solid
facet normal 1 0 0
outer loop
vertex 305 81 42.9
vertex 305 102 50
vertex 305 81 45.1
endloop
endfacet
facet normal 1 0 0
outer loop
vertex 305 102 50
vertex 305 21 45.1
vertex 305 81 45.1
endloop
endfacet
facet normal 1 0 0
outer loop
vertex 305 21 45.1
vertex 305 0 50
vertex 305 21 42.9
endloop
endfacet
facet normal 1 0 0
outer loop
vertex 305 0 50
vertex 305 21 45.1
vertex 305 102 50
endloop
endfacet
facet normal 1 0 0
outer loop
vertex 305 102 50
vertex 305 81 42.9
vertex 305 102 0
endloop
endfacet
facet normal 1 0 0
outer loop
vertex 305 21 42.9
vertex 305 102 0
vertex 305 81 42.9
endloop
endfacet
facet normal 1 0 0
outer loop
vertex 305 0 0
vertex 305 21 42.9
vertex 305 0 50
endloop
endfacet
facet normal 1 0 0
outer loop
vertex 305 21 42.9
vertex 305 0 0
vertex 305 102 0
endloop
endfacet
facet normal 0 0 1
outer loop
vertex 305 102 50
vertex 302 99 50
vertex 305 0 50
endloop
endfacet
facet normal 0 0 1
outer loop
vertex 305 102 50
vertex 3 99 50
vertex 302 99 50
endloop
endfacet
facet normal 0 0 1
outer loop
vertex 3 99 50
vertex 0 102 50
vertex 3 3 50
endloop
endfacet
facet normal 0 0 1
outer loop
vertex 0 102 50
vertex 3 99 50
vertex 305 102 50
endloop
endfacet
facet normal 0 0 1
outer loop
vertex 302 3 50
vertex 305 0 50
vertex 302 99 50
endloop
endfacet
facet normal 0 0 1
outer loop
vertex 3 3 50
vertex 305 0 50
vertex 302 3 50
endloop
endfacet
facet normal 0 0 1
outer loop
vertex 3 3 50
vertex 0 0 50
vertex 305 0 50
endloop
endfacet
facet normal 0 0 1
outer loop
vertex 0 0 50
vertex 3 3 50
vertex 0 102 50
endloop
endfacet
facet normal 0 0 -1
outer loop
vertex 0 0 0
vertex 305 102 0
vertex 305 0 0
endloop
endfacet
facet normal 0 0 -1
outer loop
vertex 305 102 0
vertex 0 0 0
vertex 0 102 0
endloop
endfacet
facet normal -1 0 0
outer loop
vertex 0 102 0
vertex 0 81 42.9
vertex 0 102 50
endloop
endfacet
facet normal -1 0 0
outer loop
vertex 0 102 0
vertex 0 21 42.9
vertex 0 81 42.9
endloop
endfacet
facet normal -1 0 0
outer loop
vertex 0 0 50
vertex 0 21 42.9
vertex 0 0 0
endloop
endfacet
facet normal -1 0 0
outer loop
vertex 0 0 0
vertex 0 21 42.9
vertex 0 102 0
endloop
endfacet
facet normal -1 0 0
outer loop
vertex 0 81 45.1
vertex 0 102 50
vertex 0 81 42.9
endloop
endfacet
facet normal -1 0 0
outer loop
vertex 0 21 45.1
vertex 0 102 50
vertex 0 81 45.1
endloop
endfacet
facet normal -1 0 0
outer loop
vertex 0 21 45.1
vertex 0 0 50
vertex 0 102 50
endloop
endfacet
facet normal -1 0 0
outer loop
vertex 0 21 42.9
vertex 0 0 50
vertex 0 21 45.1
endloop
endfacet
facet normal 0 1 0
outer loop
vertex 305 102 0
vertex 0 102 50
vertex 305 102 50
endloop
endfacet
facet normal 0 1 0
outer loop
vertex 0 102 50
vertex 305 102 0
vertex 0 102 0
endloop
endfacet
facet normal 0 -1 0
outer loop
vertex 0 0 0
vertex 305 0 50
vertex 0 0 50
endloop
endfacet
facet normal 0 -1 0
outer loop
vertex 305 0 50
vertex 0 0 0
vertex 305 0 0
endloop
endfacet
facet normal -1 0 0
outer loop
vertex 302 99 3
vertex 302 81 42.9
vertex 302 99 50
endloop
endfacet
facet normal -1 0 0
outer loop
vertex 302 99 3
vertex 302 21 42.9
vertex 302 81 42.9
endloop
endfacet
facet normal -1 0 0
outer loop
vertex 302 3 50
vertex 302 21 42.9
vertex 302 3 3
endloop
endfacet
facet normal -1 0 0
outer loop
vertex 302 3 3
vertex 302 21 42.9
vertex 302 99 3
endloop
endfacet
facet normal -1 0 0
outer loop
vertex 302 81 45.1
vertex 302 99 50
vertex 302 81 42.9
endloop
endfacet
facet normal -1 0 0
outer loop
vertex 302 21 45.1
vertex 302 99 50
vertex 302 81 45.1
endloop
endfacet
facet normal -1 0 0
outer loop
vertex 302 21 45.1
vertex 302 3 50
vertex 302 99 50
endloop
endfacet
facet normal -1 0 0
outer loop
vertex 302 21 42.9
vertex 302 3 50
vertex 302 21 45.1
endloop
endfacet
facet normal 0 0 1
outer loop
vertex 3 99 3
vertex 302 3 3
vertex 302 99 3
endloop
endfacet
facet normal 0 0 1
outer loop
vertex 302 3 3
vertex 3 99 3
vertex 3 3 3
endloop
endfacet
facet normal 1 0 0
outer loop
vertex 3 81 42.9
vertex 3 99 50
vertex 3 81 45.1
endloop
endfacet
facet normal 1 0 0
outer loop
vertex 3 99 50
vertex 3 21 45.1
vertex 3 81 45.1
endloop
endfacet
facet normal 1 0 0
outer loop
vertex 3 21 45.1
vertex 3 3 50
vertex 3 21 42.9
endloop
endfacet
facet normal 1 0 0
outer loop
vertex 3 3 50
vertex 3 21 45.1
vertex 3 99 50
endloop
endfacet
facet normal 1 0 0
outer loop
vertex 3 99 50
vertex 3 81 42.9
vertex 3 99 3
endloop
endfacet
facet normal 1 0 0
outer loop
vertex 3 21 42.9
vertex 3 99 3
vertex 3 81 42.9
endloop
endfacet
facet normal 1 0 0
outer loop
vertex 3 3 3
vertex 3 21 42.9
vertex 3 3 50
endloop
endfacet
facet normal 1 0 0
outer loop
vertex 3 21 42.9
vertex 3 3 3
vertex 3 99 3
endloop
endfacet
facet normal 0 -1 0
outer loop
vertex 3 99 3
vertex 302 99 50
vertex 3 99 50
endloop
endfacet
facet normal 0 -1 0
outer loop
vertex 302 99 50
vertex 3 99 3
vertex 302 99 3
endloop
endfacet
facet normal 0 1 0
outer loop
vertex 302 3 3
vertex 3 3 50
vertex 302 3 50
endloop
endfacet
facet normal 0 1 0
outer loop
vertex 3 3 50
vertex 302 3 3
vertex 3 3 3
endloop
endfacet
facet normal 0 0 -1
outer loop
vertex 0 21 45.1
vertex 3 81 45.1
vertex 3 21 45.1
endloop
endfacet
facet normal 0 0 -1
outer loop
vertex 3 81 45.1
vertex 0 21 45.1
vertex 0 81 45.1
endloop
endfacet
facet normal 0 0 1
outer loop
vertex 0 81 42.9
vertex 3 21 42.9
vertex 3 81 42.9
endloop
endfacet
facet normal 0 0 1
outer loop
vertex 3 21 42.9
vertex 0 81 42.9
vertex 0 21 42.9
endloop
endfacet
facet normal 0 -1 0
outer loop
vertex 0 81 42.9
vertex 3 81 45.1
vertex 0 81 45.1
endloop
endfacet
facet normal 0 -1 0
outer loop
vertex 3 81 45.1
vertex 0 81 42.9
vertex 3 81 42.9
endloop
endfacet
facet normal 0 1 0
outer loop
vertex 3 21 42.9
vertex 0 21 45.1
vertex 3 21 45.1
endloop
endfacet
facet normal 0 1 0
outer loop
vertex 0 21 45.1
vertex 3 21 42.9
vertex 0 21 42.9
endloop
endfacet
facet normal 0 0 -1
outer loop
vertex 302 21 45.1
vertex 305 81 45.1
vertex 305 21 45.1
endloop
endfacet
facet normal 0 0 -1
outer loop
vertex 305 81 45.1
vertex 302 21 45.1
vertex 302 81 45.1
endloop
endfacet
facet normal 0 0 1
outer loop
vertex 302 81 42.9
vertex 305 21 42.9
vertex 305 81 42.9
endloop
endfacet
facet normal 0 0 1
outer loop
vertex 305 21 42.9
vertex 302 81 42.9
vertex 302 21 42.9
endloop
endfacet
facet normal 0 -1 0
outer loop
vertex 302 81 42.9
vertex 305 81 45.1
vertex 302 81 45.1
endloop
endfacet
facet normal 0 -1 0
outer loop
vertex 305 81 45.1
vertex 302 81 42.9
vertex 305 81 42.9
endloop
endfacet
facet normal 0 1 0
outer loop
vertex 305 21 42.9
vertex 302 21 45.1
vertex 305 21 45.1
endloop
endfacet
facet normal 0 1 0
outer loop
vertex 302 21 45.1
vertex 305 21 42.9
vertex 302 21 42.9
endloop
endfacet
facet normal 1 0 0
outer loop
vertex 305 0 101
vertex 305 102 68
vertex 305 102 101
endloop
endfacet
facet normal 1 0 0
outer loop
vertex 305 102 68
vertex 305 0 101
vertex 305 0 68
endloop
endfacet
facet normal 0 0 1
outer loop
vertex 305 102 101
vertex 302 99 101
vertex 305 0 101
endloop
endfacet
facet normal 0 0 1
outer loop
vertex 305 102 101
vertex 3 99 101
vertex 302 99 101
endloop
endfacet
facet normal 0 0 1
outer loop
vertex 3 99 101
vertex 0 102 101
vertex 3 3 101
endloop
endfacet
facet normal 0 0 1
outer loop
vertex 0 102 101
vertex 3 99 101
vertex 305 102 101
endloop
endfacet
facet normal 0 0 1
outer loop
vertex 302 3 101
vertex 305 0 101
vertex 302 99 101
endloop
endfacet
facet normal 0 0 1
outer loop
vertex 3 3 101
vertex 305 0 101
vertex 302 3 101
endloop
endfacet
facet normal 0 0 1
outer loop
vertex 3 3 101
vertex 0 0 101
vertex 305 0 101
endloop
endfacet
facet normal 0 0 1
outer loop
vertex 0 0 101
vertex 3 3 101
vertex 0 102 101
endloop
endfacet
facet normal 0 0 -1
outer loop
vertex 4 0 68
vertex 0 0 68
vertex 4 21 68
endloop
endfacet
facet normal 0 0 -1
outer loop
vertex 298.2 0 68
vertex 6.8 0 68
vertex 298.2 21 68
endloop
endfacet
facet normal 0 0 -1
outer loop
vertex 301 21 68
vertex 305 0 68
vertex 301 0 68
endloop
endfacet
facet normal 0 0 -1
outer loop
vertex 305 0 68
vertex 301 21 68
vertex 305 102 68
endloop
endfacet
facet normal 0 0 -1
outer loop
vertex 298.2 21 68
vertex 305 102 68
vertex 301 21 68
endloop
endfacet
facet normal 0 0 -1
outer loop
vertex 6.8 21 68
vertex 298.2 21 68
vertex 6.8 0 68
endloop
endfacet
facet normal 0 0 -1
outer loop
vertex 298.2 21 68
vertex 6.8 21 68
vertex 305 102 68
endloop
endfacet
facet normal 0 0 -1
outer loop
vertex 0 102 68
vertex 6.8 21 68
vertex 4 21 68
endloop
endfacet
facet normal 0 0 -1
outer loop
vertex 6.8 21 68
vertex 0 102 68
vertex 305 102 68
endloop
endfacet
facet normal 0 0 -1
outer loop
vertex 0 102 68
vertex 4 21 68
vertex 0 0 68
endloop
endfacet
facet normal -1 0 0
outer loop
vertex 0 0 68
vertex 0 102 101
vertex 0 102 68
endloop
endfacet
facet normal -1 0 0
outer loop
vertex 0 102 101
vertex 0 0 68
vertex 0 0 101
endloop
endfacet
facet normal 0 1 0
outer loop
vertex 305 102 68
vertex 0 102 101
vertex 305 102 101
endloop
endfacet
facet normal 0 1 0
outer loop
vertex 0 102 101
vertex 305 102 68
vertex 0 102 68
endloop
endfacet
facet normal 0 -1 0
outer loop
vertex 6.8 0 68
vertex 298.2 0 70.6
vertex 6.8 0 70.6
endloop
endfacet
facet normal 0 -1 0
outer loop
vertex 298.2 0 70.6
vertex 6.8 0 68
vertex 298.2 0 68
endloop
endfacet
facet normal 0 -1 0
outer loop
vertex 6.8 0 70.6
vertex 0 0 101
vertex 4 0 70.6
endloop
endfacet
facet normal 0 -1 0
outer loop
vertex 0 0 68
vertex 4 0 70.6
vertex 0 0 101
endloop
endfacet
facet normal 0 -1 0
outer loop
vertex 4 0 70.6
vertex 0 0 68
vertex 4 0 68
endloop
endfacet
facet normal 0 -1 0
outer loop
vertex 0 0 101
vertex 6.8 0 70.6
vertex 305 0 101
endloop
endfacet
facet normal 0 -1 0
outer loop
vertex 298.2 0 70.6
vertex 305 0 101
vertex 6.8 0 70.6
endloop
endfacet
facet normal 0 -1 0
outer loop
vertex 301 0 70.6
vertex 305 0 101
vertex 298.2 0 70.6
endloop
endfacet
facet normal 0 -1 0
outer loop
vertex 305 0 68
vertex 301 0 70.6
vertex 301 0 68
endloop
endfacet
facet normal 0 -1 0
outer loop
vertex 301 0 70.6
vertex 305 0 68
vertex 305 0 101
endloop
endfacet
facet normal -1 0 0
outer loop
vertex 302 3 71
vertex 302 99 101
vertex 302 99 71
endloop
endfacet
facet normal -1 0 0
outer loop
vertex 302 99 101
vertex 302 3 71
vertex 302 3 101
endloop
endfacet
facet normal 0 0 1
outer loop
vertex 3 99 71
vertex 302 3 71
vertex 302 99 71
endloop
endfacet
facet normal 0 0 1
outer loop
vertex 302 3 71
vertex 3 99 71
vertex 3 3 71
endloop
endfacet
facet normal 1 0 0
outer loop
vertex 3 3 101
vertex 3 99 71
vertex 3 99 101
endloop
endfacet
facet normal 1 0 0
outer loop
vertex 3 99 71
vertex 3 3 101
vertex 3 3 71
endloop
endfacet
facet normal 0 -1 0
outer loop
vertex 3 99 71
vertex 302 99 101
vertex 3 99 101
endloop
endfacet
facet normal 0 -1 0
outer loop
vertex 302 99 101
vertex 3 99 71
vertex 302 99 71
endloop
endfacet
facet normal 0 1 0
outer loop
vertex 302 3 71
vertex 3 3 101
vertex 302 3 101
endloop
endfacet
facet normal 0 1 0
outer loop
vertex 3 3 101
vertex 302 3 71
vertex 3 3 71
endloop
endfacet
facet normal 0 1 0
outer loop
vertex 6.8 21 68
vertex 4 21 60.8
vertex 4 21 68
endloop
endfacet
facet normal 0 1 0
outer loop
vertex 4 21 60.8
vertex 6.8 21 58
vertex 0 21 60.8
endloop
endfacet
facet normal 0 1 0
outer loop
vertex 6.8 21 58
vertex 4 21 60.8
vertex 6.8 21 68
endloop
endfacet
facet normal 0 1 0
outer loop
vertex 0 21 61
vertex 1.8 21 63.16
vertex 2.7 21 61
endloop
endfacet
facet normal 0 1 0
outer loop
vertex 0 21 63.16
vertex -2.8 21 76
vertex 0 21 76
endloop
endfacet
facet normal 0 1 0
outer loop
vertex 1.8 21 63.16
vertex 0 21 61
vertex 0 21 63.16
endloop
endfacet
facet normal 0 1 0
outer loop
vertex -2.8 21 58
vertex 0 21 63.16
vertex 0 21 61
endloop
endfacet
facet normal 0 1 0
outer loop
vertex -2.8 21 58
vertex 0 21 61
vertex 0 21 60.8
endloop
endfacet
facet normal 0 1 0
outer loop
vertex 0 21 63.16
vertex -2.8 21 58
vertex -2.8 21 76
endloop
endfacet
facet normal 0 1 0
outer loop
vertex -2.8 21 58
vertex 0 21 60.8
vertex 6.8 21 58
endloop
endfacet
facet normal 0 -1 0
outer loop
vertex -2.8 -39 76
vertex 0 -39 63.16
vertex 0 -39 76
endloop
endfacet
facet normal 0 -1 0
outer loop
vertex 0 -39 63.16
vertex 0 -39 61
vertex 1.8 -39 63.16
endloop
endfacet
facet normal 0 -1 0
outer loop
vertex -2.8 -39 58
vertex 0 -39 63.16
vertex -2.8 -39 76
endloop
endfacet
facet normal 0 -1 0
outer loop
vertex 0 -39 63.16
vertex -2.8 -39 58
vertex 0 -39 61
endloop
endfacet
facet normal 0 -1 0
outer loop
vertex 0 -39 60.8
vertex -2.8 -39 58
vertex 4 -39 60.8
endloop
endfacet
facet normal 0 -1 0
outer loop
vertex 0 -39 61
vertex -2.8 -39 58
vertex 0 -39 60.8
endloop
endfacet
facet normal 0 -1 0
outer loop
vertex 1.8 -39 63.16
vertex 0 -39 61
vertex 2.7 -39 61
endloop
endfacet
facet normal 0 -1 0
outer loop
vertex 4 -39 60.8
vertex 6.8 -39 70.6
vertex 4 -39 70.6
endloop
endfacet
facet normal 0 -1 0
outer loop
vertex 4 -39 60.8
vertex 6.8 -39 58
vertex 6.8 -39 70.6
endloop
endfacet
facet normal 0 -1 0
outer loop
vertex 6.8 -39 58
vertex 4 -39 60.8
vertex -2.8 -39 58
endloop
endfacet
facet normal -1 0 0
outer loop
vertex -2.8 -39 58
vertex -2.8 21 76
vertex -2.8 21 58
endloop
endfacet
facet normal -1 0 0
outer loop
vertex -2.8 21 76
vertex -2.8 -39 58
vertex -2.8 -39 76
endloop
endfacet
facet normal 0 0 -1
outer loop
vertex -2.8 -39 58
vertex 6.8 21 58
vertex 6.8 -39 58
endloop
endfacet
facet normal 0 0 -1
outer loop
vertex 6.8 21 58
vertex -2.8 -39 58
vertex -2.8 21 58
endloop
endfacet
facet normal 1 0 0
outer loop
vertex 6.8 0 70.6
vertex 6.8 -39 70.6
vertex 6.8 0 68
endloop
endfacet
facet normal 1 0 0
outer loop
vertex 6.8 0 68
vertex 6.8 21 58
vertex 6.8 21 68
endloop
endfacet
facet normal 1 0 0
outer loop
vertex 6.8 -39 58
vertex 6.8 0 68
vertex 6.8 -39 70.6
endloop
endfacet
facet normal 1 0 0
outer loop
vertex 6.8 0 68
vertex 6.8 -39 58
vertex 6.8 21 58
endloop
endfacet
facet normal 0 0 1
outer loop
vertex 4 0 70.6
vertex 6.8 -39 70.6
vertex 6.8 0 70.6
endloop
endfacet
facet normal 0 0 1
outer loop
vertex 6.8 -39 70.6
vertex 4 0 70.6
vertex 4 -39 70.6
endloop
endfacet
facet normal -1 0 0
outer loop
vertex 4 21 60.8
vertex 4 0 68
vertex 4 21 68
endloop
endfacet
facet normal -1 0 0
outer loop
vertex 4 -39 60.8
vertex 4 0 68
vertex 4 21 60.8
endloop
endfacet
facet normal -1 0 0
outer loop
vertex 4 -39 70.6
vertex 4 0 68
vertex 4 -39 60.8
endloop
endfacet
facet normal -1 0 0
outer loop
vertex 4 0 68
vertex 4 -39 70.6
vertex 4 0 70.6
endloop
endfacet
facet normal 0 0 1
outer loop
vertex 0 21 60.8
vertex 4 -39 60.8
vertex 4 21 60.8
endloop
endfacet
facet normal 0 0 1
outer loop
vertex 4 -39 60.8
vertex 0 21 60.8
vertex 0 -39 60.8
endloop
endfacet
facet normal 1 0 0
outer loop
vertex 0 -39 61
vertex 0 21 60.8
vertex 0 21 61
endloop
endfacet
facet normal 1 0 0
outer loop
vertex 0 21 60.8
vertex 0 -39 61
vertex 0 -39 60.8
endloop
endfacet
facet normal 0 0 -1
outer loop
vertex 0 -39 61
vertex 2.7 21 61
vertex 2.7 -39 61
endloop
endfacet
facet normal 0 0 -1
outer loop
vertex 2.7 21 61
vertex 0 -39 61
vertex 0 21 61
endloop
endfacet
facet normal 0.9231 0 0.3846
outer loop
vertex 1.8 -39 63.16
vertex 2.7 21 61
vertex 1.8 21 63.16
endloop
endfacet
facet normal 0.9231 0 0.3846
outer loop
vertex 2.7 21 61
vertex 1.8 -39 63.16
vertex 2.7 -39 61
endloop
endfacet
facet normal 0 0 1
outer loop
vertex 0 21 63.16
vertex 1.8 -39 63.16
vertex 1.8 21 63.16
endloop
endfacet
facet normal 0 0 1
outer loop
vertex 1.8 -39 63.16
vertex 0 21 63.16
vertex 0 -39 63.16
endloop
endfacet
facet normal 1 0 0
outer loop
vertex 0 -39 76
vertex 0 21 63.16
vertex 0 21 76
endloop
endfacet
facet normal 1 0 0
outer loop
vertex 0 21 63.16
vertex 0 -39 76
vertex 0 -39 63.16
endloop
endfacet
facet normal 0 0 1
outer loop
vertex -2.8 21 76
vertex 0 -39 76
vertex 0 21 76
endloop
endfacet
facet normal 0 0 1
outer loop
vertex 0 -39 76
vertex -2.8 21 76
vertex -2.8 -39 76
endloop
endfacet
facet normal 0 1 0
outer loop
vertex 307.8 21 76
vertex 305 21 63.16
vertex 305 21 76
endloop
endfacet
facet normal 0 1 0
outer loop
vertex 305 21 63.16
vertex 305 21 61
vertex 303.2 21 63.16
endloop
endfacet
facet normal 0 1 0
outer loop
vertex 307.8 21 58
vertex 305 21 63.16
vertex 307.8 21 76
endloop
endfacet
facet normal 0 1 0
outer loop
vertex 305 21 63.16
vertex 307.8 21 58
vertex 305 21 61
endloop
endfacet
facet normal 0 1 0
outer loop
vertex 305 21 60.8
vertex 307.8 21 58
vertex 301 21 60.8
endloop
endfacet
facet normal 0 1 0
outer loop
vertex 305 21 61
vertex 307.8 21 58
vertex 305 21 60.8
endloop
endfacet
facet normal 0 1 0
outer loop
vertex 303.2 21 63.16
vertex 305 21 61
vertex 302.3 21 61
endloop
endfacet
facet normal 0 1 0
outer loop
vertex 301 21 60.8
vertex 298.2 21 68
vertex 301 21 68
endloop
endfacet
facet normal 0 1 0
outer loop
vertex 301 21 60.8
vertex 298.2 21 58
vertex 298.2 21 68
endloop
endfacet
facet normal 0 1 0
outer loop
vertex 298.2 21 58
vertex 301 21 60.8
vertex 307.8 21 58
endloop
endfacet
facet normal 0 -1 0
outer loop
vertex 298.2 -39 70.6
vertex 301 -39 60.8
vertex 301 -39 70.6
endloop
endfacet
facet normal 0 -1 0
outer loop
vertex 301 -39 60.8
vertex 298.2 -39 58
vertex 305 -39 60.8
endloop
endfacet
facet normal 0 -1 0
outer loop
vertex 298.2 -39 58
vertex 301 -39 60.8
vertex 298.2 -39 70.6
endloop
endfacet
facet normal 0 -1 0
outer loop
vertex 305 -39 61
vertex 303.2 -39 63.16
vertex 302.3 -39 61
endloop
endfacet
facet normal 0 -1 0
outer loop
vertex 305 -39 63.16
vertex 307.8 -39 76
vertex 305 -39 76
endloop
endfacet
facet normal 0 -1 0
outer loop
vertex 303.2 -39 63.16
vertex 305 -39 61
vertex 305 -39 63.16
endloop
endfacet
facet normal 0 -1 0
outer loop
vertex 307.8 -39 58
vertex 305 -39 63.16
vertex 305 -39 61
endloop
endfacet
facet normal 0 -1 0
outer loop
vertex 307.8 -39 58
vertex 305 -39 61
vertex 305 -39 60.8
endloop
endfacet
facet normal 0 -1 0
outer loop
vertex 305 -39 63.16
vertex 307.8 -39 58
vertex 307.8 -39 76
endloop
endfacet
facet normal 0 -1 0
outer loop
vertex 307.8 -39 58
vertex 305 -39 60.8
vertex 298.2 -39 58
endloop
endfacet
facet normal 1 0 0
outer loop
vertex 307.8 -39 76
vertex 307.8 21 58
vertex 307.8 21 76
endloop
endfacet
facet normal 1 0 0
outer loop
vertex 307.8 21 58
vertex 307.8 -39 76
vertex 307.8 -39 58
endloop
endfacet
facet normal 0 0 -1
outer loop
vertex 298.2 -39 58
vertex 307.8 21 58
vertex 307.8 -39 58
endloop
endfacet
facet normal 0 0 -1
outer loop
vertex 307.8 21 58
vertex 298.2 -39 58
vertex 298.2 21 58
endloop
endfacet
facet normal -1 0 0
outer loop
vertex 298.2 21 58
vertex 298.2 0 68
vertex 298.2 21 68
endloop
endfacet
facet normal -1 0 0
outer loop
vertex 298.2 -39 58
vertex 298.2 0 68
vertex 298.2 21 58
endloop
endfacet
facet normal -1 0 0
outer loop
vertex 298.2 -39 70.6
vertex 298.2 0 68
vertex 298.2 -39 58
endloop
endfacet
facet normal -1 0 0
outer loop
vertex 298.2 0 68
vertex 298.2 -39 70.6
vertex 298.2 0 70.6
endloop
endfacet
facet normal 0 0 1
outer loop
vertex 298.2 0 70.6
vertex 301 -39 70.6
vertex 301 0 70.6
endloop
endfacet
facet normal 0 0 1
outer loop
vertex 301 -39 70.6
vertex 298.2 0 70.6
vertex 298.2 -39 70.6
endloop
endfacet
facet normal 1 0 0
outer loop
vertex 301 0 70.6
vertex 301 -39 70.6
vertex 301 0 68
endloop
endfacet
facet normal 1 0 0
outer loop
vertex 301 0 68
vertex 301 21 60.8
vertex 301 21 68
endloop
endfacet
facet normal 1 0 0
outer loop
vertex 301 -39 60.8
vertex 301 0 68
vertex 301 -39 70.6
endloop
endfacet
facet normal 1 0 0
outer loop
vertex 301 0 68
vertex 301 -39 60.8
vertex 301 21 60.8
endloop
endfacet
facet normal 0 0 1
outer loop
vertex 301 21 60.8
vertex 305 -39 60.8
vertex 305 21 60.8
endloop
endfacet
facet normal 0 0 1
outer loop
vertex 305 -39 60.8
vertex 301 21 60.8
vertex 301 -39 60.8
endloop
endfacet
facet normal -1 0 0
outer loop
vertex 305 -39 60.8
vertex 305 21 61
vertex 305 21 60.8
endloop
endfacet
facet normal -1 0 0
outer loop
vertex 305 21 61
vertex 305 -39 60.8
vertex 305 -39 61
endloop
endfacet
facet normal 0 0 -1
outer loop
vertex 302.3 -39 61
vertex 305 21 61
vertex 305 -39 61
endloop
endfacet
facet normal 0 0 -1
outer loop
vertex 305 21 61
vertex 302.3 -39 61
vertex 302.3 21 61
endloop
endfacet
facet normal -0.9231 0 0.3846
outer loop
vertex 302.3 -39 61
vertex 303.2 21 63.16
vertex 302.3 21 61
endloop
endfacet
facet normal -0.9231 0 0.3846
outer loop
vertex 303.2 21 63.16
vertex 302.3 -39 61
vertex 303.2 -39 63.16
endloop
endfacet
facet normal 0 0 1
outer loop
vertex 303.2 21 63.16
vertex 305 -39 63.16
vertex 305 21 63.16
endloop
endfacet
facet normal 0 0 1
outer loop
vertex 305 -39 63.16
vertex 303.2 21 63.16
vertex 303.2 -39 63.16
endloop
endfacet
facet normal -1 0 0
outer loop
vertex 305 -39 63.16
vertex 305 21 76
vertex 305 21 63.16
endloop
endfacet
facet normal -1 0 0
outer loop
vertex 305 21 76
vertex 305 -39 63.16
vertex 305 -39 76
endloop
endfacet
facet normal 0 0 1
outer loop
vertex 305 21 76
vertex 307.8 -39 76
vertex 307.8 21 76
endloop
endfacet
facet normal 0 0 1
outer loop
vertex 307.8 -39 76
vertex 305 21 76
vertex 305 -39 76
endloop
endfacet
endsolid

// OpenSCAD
// 05_c_clip_ends.scad
// Push-down C-clips on short ends: two independent C-shaped clips (one per
// short end, Y=0 and Y=LY) that slide over BOTH mating walls simultaneously.
// Each clip wraps around the junction of upper+lower tray on the short face,
// with an inner ledge that hooks under the lower tray's top rim.
// Engage: push clip straight DOWN onto the stacked short-end walls.
// Release: pull clip straight UP (or lever with fingernail under the bottom lip).
// Also resists X-slide via friction fit of the C-channel width.

$fn = 36;
EXPLODE = 18;  // 0 = engaged, >0 = exploded view

/* ---- tray dimensions ---- */
LX = 305; LY = 102; LZ = 50;   // lower tray (short dim = Y = 102mm)
UX = 305; UY = 102; UZ = 33;   // upper tray
W  = 3;                          // wall thickness

/* ---- C-clip params ---- */
// The clip straddles the combined wall thickness on the short-end (X) face.
// Short end = X=0 and X=LX faces.  Combined stack thickness = W (lower) + W (upper)
// The C channel is slightly deeper to also grip the step.

CC_W    = 60;    // width of clip along Y (centered on the short end face)
CC_T    = 2.8;   // clip arm thickness
CC_H    = 18;    // total clip height (spans across tray junction + ledge zone)
// inner channel width = combined wall thickness of stacked trays + small gap
WALL_STACK = W;  // both trays have the same wall, they are flush on the outer face
// The lower tray wall outer face is the reference; upper sits on top, same X.
CHANNEL_W = W + 1.0;  // inner slot width: snug on the wall
CHANNEL_DEPTH = CC_H; // full depth, open bottom

// snap ledge on the INSIDE of the clip's inner (lower) arm
// hooks under a small notch printed on the lower tray end wall
LEDGE_H  = 1.8;  // ledge height on clip inner arm (protrudes inward in Z)
LEDGE_OFF = 3.0; // from bottom of clip
NOTCH_H  = 2.0;  // matching notch height in lower tray
NOTCH_D  = 1.6;  // notch depth (inward from outer face)

// Clip centered on short end face at X=0; the face runs in Y from 0..LY
// Clip spans Y from (LY/2 - CC_W/2) to (LY/2 + CC_W/2)
CC_Y0 = LY/2 - CC_W/2;

// vertical position: clip sits straddling the LZ (top of lower tray)
// bottom of clip at LZ - (CC_H - overlap), where overlap into lower tray region
OVERLAP = 10;   // how far clip descends below LZ
CC_Z0   = LZ - OVERLAP;

module lower_tray() {
    color("SteelBlue", 0.85)
    union() {
        difference() {
            cube([LX, LY, LZ]);
            translate([W, W, W]) cube([LX-2*W, LY-2*W, LZ]);
            // Notch on X=0 short end face for clip ledge
            translate([-0.1, CC_Y0, CC_Z0 + LEDGE_OFF - 0.1])
                cube([W + NOTCH_D + 0.1, CC_W, NOTCH_H + 0.2]);
            // Notch on X=LX short end face
            translate([LX - W - NOTCH_D, CC_Y0, CC_Z0 + LEDGE_OFF - 0.1])
                cube([W + NOTCH_D + 0.1, CC_W, NOTCH_H + 0.2]);
        }
    }
}

module upper_tray() {
    color("Tomato", 0.85)
    difference() {
        cube([UX, UY, UZ]);
        translate([W, W, W]) cube([UX-2*W, UY-2*W, UZ]);
    }
}

// C-clip cross section profile in the XZ plane (local coords)
// The C opens upward (so it can push down over the wall stack)
// x=0 is the outer face of the tray wall
// z=0 is bottom of clip
// Channel: from z=0 to z=CC_H, width CHANNEL_W, open at top
module c_clip_profile() {
    // outer back wall
    square([CC_T, CC_H]);
    // inner front wall (closer to inside of tray) — shorter so clip can flex over wall
    translate([CC_T + CHANNEL_W, 0]) square([CC_T, CC_H * 0.7]);
    // bottom connecting web
    translate([0, 0]) square([CC_T*2 + CHANNEL_W, CC_T]);
    // snap ledge on inner wall interior face (protrudes in +X toward channel)
    // sits at LEDGE_OFF from bottom
    translate([CC_T, LEDGE_OFF])
        polygon(points=[
            [0, 0],
            [LEDGE_H*1.5, 0],
            [LEDGE_H, LEDGE_H*1.2],
            [0, LEDGE_H*1.2]
        ]);
}

// One C-clip, placed at short end X=0 or X=LX
// flip=true mirrors for X=LX end
module c_clip(flip=false) {
    color("OrangeRed", 0.92)
    translate([flip ? LX : 0, CC_Y0, CC_Z0])
    mirror([flip ? 1 : 0, 0, 0])
    translate([-CC_T, 0, 0])   // position outer wall flush with outer face
    rotate([90, 0, 0])
    linear_extrude(CC_W)
    c_clip_profile();
}

/* ---- assembly ---- */
lower_tray();

translate([0, 0, LZ + EXPLODE]) {
    upper_tray();
}

// Clips stay at their Z position (they span the junction)
// In exploded view move them up with the upper tray for clarity
translate([0, 0, EXPLODE]) {
    c_clip(flip=false);
    c_clip(flip=true);
}
